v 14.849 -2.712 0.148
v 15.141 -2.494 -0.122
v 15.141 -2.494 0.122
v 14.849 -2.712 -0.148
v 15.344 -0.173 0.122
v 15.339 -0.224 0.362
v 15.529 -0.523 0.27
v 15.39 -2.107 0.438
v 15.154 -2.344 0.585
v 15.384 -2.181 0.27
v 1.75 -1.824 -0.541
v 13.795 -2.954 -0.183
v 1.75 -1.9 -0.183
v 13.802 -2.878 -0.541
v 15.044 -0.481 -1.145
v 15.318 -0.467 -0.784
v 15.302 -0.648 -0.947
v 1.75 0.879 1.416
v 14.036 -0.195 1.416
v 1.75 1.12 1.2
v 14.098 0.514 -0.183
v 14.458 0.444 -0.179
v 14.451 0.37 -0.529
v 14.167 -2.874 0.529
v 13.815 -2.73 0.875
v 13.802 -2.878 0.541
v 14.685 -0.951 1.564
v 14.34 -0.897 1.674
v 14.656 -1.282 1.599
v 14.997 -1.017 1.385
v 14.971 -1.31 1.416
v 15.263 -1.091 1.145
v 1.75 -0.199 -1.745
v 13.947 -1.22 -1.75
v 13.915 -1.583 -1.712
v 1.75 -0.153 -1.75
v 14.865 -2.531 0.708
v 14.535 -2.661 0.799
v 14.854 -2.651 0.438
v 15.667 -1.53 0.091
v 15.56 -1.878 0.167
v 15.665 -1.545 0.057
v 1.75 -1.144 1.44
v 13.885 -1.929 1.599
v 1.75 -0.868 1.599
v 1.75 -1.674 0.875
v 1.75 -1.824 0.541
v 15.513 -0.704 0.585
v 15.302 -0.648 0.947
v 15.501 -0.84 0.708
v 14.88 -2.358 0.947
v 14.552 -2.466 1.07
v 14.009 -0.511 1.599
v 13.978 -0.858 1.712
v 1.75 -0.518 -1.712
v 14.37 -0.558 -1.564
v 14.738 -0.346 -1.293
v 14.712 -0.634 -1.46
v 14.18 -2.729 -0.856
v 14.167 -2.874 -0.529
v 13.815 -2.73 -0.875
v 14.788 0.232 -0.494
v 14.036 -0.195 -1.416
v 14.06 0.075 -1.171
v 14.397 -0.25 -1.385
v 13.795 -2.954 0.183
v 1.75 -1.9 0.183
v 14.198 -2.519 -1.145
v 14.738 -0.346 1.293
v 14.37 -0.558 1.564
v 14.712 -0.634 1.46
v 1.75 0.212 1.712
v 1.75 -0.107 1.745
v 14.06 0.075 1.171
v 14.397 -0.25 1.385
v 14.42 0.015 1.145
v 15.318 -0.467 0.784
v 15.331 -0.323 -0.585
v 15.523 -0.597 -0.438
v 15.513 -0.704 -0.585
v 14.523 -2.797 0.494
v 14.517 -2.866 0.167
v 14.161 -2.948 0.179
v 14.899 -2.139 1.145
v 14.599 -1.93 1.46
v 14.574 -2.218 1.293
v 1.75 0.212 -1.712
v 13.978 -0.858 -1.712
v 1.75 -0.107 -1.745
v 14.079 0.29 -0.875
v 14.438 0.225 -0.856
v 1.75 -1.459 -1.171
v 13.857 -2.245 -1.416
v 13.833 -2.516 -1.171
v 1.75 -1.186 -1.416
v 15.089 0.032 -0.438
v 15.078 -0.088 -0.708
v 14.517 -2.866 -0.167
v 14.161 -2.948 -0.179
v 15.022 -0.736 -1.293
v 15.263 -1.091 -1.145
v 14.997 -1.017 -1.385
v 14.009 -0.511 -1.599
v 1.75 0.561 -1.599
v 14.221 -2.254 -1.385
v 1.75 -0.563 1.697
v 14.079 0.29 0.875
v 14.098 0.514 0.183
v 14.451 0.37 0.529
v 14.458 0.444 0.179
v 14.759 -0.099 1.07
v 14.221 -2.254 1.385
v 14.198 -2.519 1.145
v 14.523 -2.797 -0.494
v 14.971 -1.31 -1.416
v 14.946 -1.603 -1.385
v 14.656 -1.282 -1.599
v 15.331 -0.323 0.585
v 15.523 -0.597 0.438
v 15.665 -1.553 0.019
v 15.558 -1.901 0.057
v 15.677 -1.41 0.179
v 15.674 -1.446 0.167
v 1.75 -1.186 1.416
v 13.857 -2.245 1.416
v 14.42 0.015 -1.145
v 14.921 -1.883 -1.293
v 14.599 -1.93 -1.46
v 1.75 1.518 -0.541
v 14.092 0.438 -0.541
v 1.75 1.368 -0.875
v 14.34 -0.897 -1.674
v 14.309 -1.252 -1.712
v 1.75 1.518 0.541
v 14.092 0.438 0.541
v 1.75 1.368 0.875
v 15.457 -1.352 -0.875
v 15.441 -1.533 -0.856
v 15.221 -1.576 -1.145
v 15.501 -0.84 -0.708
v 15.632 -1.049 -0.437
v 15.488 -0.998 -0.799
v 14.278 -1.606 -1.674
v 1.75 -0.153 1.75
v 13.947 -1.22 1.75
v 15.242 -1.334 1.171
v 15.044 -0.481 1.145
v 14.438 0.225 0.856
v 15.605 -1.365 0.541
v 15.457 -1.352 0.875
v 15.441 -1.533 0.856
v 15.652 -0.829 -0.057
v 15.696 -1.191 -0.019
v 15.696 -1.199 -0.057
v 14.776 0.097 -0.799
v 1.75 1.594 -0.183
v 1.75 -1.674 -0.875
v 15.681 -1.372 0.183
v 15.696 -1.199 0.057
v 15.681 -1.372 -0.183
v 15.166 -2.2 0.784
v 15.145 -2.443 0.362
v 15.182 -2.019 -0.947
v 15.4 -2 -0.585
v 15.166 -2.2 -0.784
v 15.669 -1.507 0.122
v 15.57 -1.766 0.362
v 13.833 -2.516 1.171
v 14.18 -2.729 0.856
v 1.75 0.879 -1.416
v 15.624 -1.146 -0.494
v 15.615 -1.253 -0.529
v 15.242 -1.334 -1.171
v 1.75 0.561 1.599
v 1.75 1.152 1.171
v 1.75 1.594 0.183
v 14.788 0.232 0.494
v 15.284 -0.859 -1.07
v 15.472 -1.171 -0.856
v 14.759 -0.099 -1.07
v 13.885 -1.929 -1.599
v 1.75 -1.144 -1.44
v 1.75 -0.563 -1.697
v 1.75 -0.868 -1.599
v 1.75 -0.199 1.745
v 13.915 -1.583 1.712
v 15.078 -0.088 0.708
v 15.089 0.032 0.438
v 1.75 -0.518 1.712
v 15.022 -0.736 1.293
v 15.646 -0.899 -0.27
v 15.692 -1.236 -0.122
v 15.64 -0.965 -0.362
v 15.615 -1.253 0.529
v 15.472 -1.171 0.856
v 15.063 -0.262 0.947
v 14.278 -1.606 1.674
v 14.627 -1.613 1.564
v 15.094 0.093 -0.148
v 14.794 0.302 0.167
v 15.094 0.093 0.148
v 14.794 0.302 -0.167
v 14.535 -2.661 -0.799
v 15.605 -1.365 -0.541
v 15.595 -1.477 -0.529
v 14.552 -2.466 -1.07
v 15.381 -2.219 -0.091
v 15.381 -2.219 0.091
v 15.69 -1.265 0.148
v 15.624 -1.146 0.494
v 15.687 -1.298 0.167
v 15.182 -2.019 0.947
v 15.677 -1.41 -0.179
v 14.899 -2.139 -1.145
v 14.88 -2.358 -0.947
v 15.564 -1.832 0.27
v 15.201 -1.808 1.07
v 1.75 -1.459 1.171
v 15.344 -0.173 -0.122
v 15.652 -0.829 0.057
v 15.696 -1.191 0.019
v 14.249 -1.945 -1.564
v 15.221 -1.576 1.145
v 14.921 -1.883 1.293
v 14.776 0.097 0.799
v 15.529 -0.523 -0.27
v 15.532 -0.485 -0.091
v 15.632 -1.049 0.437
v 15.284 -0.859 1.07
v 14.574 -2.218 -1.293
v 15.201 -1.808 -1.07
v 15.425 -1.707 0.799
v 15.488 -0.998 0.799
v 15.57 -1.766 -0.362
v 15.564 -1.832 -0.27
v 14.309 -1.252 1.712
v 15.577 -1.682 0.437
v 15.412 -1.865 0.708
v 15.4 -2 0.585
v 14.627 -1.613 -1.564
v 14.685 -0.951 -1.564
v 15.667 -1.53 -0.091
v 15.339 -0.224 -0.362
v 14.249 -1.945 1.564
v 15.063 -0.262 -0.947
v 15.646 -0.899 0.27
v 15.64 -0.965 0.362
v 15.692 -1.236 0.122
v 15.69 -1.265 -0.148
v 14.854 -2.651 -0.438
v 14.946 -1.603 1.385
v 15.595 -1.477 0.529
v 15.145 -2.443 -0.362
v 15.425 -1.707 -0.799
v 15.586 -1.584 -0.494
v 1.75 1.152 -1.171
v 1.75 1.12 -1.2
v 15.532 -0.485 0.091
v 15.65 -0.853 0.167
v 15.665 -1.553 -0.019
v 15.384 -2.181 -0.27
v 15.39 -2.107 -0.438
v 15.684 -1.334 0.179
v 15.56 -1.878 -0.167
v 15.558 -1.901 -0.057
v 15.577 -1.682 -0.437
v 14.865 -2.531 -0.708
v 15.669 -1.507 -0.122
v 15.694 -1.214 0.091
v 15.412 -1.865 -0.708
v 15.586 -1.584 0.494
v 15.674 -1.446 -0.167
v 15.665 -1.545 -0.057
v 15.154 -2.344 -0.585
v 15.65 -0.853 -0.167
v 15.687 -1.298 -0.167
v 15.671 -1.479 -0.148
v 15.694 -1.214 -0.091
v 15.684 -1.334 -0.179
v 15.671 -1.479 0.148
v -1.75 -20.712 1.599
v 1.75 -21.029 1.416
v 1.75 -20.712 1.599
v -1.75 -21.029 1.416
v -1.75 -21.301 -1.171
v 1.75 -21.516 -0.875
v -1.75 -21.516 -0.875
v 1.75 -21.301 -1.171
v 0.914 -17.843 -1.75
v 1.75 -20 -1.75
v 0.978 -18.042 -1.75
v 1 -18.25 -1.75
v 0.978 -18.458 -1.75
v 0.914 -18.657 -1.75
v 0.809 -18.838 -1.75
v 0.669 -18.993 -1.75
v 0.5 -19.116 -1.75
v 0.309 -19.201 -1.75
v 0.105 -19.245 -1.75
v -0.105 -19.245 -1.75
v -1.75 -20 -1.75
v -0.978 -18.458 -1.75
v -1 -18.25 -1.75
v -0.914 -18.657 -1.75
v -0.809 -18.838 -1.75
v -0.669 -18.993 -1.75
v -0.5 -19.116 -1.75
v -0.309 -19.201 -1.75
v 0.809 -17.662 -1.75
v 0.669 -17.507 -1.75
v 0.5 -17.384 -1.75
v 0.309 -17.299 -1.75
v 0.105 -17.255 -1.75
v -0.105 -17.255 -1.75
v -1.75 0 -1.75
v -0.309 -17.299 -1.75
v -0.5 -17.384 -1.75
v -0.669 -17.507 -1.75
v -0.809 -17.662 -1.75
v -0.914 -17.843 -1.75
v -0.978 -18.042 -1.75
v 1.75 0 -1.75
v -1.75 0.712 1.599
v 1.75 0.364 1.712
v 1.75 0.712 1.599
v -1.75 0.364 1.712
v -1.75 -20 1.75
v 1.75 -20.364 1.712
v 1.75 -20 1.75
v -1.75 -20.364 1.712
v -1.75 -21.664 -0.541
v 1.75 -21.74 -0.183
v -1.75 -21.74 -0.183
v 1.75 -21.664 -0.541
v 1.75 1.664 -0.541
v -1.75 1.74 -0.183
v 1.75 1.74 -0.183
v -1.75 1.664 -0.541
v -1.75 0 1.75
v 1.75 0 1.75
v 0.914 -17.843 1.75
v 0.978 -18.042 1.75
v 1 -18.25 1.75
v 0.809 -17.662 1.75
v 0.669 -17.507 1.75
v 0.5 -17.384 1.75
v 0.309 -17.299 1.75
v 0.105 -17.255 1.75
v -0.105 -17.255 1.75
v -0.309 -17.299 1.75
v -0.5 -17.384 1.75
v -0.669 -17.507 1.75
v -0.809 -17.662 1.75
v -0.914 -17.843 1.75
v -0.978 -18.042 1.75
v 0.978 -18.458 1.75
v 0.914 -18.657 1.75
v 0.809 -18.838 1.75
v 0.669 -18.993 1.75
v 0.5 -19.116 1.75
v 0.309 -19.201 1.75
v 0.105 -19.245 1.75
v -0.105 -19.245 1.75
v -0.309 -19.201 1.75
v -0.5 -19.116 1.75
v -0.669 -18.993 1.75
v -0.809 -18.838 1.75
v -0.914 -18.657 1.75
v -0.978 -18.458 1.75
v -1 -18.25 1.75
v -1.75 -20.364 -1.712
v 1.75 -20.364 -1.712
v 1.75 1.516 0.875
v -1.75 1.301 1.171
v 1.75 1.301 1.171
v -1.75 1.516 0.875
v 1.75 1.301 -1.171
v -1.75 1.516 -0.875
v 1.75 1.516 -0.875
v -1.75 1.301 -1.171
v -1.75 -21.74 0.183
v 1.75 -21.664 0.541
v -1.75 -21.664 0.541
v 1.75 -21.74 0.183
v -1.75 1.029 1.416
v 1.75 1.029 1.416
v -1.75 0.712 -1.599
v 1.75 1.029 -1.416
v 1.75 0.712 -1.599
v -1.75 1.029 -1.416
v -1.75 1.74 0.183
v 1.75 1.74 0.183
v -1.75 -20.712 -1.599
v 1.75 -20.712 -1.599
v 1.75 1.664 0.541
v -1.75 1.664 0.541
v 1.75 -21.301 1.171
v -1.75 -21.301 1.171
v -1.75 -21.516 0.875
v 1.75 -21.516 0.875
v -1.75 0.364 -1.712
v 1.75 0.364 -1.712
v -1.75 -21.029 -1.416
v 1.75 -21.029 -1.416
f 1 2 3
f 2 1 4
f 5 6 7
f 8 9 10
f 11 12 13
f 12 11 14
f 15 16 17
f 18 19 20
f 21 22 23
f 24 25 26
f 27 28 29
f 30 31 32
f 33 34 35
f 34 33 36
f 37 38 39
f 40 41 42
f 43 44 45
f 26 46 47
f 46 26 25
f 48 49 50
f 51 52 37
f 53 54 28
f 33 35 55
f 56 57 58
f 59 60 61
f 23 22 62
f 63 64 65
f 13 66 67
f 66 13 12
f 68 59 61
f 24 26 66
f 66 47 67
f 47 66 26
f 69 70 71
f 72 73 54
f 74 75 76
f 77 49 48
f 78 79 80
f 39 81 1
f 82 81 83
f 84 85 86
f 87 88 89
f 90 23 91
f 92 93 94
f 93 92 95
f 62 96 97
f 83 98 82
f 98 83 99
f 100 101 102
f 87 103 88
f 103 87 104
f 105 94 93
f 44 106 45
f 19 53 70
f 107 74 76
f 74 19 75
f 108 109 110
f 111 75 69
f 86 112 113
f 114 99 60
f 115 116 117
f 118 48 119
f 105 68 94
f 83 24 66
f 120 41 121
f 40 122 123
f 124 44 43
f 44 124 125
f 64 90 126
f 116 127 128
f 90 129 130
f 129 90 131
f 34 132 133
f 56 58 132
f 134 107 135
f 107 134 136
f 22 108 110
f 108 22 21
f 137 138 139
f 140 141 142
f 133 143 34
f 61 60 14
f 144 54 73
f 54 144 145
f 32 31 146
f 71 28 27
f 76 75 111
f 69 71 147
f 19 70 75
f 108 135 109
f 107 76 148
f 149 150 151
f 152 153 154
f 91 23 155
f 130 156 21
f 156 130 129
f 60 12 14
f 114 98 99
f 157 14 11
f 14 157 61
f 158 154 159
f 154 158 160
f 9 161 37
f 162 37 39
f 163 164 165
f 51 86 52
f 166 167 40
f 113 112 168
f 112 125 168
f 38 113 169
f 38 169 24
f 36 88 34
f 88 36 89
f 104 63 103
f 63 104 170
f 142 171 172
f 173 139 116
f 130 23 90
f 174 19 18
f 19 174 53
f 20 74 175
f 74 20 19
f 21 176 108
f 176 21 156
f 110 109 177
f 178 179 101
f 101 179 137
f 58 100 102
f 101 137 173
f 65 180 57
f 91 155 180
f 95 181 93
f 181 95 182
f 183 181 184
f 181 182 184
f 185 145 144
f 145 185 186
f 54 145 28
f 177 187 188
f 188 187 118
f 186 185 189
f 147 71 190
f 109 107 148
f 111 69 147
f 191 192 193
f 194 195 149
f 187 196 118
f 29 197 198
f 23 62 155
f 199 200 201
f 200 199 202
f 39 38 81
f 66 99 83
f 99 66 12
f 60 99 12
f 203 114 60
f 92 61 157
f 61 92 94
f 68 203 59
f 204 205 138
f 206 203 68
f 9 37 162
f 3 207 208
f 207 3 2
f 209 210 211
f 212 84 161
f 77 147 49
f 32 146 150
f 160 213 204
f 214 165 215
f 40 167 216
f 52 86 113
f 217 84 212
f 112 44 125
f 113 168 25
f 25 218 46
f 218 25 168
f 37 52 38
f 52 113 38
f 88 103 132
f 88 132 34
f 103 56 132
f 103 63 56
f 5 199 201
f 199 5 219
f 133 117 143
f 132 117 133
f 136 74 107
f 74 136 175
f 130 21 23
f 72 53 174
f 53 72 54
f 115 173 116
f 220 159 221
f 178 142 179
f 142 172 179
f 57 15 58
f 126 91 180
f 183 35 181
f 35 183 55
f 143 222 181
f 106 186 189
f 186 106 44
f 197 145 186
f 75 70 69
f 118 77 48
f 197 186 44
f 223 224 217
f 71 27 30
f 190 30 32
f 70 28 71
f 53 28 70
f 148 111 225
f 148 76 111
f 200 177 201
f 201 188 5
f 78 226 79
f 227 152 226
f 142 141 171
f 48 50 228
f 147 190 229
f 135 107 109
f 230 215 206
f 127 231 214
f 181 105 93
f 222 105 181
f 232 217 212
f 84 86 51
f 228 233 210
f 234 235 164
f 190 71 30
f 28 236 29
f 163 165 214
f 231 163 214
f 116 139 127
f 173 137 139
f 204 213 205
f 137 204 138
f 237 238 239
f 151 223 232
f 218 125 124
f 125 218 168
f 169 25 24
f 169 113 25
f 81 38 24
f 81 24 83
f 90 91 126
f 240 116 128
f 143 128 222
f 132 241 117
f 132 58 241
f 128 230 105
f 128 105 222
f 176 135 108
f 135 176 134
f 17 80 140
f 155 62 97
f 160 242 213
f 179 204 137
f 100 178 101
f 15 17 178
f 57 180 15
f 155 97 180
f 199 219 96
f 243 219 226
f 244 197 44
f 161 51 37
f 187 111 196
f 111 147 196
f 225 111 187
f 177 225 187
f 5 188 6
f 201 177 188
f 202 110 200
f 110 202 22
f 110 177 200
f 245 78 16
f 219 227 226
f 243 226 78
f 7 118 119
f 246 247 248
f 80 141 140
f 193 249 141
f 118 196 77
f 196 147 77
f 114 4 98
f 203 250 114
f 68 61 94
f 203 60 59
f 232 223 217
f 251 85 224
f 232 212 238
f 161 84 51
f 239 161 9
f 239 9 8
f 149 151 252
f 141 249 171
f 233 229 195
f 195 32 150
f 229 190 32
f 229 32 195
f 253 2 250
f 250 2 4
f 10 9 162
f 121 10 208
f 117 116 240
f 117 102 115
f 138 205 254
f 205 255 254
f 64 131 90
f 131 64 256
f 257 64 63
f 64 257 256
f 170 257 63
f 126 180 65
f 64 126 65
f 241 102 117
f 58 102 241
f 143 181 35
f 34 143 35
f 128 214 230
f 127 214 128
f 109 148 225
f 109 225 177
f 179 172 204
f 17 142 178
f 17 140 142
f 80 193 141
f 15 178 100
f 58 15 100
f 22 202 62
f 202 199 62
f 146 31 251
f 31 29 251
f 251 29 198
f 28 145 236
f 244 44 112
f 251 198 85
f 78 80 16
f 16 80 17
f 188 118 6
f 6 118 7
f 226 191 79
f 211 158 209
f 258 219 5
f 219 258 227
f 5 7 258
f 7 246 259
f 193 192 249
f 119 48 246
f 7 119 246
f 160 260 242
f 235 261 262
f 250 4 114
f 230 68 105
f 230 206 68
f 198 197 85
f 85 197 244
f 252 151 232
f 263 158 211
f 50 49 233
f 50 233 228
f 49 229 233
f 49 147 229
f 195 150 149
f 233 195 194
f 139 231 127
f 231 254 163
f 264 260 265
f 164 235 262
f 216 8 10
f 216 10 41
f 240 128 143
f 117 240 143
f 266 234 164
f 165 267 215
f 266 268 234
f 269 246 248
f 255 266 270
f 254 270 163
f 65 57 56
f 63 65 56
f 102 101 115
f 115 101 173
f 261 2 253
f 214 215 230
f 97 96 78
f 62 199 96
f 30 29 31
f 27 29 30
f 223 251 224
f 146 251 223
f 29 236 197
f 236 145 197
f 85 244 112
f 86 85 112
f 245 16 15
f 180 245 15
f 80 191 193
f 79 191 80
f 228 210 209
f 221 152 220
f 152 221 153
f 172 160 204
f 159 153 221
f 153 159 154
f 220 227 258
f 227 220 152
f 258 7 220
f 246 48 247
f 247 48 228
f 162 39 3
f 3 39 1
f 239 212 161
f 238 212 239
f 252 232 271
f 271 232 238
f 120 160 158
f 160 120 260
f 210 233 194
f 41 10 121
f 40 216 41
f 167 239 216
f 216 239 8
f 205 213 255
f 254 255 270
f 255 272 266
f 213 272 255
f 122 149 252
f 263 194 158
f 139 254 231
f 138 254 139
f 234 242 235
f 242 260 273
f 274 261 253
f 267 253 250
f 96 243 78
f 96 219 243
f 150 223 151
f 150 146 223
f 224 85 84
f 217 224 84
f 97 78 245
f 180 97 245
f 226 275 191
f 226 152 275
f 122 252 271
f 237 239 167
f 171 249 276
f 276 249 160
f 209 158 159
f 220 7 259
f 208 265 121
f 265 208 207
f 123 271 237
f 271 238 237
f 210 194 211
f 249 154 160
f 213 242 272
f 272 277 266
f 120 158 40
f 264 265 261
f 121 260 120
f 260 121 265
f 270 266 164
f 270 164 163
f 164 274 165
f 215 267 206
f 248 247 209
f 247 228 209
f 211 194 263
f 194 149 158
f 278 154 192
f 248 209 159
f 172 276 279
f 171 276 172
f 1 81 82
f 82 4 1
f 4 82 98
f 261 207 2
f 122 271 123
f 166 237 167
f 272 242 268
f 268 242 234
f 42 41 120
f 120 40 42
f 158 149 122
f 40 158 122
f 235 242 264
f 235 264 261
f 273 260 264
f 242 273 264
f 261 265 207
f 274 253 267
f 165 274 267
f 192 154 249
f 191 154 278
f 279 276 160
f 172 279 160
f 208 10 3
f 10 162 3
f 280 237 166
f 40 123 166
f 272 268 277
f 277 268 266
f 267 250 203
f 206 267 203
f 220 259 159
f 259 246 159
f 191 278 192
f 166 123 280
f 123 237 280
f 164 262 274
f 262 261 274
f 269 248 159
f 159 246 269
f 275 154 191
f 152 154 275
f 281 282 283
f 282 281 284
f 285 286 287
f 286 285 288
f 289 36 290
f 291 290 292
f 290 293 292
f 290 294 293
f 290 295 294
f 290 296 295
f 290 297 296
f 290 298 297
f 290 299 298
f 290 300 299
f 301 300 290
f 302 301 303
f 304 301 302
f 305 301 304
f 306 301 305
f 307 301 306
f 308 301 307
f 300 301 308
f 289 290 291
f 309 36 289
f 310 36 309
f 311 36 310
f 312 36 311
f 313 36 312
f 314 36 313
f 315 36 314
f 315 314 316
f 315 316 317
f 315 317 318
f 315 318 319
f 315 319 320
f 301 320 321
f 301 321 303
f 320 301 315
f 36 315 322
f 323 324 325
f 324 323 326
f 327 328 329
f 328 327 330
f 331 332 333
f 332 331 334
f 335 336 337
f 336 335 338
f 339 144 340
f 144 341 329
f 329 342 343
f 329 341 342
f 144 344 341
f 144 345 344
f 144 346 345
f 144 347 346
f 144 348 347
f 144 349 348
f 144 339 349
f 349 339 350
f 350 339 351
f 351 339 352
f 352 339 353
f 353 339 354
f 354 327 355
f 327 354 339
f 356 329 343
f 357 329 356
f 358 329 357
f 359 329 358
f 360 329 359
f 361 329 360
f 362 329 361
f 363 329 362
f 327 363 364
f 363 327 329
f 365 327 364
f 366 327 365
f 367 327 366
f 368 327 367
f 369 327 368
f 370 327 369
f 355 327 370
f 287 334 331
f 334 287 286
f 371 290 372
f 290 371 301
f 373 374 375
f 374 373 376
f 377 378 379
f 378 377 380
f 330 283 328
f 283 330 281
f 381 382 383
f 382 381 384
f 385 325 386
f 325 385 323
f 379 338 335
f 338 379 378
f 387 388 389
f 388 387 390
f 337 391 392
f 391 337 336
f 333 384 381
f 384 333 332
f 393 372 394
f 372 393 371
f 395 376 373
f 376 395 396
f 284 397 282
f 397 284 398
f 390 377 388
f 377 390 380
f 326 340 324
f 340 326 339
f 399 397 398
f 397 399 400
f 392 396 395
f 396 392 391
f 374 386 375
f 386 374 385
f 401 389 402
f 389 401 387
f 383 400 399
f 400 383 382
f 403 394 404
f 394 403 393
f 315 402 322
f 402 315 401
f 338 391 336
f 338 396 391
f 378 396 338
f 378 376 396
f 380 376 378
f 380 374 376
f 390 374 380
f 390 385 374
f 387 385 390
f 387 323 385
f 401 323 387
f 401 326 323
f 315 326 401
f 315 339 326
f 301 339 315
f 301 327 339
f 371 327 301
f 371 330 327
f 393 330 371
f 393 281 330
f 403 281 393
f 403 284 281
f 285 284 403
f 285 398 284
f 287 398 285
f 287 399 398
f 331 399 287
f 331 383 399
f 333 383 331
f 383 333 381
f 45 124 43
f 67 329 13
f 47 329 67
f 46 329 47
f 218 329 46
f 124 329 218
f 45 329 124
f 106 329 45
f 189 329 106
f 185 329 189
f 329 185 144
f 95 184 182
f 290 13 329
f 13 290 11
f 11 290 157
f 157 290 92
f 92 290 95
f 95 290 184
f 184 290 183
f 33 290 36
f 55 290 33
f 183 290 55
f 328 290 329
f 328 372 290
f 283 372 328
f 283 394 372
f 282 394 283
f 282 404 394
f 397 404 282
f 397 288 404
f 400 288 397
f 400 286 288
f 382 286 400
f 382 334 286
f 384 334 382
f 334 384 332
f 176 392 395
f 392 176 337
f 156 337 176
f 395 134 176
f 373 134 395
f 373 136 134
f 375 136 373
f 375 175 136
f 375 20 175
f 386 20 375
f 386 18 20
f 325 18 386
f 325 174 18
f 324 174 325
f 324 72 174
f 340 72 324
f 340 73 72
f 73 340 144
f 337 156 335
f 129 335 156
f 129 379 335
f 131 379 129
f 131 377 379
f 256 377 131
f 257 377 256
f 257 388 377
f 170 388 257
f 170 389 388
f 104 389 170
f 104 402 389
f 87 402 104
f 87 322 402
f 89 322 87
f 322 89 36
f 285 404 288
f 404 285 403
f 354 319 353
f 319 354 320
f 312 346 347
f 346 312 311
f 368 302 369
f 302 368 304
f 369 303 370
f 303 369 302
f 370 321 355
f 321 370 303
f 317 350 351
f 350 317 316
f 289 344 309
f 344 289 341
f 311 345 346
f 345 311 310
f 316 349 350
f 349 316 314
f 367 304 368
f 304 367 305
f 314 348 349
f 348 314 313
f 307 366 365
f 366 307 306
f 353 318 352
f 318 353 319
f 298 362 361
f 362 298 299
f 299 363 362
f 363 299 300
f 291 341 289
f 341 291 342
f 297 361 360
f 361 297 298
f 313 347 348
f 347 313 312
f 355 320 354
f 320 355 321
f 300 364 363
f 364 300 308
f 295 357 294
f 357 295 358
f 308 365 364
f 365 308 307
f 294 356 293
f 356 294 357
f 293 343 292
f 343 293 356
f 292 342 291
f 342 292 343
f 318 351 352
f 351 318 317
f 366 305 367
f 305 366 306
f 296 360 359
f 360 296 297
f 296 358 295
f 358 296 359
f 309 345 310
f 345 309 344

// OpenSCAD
d = 3.5;
l = 20;
$fn = 30;

module hook()
{
  // rod
  intersection()
  {
    rotate([5, 0, 0])
      hull()
      {
        sphere(d=d);
        translate([0, 0, 14])
          sphere(d=d);
      }
    translate([0, 0, -d])
      cylinder(d=15, h=30, $fn=5);
  }
  // mount
  difference()
  {
    hull()
    {
      cylinder(d=d, h=d, center=true);
      translate([0, -l, 0])
        cylinder(d=d, h=d, center=true);
    }
    rotate([0, 90, 0])
    translate([0, -l+d/2, 0])
      cylinder(d=2, h=d+2, center=true);
  }
}

rotate([0, 90, 0])
  hook();
